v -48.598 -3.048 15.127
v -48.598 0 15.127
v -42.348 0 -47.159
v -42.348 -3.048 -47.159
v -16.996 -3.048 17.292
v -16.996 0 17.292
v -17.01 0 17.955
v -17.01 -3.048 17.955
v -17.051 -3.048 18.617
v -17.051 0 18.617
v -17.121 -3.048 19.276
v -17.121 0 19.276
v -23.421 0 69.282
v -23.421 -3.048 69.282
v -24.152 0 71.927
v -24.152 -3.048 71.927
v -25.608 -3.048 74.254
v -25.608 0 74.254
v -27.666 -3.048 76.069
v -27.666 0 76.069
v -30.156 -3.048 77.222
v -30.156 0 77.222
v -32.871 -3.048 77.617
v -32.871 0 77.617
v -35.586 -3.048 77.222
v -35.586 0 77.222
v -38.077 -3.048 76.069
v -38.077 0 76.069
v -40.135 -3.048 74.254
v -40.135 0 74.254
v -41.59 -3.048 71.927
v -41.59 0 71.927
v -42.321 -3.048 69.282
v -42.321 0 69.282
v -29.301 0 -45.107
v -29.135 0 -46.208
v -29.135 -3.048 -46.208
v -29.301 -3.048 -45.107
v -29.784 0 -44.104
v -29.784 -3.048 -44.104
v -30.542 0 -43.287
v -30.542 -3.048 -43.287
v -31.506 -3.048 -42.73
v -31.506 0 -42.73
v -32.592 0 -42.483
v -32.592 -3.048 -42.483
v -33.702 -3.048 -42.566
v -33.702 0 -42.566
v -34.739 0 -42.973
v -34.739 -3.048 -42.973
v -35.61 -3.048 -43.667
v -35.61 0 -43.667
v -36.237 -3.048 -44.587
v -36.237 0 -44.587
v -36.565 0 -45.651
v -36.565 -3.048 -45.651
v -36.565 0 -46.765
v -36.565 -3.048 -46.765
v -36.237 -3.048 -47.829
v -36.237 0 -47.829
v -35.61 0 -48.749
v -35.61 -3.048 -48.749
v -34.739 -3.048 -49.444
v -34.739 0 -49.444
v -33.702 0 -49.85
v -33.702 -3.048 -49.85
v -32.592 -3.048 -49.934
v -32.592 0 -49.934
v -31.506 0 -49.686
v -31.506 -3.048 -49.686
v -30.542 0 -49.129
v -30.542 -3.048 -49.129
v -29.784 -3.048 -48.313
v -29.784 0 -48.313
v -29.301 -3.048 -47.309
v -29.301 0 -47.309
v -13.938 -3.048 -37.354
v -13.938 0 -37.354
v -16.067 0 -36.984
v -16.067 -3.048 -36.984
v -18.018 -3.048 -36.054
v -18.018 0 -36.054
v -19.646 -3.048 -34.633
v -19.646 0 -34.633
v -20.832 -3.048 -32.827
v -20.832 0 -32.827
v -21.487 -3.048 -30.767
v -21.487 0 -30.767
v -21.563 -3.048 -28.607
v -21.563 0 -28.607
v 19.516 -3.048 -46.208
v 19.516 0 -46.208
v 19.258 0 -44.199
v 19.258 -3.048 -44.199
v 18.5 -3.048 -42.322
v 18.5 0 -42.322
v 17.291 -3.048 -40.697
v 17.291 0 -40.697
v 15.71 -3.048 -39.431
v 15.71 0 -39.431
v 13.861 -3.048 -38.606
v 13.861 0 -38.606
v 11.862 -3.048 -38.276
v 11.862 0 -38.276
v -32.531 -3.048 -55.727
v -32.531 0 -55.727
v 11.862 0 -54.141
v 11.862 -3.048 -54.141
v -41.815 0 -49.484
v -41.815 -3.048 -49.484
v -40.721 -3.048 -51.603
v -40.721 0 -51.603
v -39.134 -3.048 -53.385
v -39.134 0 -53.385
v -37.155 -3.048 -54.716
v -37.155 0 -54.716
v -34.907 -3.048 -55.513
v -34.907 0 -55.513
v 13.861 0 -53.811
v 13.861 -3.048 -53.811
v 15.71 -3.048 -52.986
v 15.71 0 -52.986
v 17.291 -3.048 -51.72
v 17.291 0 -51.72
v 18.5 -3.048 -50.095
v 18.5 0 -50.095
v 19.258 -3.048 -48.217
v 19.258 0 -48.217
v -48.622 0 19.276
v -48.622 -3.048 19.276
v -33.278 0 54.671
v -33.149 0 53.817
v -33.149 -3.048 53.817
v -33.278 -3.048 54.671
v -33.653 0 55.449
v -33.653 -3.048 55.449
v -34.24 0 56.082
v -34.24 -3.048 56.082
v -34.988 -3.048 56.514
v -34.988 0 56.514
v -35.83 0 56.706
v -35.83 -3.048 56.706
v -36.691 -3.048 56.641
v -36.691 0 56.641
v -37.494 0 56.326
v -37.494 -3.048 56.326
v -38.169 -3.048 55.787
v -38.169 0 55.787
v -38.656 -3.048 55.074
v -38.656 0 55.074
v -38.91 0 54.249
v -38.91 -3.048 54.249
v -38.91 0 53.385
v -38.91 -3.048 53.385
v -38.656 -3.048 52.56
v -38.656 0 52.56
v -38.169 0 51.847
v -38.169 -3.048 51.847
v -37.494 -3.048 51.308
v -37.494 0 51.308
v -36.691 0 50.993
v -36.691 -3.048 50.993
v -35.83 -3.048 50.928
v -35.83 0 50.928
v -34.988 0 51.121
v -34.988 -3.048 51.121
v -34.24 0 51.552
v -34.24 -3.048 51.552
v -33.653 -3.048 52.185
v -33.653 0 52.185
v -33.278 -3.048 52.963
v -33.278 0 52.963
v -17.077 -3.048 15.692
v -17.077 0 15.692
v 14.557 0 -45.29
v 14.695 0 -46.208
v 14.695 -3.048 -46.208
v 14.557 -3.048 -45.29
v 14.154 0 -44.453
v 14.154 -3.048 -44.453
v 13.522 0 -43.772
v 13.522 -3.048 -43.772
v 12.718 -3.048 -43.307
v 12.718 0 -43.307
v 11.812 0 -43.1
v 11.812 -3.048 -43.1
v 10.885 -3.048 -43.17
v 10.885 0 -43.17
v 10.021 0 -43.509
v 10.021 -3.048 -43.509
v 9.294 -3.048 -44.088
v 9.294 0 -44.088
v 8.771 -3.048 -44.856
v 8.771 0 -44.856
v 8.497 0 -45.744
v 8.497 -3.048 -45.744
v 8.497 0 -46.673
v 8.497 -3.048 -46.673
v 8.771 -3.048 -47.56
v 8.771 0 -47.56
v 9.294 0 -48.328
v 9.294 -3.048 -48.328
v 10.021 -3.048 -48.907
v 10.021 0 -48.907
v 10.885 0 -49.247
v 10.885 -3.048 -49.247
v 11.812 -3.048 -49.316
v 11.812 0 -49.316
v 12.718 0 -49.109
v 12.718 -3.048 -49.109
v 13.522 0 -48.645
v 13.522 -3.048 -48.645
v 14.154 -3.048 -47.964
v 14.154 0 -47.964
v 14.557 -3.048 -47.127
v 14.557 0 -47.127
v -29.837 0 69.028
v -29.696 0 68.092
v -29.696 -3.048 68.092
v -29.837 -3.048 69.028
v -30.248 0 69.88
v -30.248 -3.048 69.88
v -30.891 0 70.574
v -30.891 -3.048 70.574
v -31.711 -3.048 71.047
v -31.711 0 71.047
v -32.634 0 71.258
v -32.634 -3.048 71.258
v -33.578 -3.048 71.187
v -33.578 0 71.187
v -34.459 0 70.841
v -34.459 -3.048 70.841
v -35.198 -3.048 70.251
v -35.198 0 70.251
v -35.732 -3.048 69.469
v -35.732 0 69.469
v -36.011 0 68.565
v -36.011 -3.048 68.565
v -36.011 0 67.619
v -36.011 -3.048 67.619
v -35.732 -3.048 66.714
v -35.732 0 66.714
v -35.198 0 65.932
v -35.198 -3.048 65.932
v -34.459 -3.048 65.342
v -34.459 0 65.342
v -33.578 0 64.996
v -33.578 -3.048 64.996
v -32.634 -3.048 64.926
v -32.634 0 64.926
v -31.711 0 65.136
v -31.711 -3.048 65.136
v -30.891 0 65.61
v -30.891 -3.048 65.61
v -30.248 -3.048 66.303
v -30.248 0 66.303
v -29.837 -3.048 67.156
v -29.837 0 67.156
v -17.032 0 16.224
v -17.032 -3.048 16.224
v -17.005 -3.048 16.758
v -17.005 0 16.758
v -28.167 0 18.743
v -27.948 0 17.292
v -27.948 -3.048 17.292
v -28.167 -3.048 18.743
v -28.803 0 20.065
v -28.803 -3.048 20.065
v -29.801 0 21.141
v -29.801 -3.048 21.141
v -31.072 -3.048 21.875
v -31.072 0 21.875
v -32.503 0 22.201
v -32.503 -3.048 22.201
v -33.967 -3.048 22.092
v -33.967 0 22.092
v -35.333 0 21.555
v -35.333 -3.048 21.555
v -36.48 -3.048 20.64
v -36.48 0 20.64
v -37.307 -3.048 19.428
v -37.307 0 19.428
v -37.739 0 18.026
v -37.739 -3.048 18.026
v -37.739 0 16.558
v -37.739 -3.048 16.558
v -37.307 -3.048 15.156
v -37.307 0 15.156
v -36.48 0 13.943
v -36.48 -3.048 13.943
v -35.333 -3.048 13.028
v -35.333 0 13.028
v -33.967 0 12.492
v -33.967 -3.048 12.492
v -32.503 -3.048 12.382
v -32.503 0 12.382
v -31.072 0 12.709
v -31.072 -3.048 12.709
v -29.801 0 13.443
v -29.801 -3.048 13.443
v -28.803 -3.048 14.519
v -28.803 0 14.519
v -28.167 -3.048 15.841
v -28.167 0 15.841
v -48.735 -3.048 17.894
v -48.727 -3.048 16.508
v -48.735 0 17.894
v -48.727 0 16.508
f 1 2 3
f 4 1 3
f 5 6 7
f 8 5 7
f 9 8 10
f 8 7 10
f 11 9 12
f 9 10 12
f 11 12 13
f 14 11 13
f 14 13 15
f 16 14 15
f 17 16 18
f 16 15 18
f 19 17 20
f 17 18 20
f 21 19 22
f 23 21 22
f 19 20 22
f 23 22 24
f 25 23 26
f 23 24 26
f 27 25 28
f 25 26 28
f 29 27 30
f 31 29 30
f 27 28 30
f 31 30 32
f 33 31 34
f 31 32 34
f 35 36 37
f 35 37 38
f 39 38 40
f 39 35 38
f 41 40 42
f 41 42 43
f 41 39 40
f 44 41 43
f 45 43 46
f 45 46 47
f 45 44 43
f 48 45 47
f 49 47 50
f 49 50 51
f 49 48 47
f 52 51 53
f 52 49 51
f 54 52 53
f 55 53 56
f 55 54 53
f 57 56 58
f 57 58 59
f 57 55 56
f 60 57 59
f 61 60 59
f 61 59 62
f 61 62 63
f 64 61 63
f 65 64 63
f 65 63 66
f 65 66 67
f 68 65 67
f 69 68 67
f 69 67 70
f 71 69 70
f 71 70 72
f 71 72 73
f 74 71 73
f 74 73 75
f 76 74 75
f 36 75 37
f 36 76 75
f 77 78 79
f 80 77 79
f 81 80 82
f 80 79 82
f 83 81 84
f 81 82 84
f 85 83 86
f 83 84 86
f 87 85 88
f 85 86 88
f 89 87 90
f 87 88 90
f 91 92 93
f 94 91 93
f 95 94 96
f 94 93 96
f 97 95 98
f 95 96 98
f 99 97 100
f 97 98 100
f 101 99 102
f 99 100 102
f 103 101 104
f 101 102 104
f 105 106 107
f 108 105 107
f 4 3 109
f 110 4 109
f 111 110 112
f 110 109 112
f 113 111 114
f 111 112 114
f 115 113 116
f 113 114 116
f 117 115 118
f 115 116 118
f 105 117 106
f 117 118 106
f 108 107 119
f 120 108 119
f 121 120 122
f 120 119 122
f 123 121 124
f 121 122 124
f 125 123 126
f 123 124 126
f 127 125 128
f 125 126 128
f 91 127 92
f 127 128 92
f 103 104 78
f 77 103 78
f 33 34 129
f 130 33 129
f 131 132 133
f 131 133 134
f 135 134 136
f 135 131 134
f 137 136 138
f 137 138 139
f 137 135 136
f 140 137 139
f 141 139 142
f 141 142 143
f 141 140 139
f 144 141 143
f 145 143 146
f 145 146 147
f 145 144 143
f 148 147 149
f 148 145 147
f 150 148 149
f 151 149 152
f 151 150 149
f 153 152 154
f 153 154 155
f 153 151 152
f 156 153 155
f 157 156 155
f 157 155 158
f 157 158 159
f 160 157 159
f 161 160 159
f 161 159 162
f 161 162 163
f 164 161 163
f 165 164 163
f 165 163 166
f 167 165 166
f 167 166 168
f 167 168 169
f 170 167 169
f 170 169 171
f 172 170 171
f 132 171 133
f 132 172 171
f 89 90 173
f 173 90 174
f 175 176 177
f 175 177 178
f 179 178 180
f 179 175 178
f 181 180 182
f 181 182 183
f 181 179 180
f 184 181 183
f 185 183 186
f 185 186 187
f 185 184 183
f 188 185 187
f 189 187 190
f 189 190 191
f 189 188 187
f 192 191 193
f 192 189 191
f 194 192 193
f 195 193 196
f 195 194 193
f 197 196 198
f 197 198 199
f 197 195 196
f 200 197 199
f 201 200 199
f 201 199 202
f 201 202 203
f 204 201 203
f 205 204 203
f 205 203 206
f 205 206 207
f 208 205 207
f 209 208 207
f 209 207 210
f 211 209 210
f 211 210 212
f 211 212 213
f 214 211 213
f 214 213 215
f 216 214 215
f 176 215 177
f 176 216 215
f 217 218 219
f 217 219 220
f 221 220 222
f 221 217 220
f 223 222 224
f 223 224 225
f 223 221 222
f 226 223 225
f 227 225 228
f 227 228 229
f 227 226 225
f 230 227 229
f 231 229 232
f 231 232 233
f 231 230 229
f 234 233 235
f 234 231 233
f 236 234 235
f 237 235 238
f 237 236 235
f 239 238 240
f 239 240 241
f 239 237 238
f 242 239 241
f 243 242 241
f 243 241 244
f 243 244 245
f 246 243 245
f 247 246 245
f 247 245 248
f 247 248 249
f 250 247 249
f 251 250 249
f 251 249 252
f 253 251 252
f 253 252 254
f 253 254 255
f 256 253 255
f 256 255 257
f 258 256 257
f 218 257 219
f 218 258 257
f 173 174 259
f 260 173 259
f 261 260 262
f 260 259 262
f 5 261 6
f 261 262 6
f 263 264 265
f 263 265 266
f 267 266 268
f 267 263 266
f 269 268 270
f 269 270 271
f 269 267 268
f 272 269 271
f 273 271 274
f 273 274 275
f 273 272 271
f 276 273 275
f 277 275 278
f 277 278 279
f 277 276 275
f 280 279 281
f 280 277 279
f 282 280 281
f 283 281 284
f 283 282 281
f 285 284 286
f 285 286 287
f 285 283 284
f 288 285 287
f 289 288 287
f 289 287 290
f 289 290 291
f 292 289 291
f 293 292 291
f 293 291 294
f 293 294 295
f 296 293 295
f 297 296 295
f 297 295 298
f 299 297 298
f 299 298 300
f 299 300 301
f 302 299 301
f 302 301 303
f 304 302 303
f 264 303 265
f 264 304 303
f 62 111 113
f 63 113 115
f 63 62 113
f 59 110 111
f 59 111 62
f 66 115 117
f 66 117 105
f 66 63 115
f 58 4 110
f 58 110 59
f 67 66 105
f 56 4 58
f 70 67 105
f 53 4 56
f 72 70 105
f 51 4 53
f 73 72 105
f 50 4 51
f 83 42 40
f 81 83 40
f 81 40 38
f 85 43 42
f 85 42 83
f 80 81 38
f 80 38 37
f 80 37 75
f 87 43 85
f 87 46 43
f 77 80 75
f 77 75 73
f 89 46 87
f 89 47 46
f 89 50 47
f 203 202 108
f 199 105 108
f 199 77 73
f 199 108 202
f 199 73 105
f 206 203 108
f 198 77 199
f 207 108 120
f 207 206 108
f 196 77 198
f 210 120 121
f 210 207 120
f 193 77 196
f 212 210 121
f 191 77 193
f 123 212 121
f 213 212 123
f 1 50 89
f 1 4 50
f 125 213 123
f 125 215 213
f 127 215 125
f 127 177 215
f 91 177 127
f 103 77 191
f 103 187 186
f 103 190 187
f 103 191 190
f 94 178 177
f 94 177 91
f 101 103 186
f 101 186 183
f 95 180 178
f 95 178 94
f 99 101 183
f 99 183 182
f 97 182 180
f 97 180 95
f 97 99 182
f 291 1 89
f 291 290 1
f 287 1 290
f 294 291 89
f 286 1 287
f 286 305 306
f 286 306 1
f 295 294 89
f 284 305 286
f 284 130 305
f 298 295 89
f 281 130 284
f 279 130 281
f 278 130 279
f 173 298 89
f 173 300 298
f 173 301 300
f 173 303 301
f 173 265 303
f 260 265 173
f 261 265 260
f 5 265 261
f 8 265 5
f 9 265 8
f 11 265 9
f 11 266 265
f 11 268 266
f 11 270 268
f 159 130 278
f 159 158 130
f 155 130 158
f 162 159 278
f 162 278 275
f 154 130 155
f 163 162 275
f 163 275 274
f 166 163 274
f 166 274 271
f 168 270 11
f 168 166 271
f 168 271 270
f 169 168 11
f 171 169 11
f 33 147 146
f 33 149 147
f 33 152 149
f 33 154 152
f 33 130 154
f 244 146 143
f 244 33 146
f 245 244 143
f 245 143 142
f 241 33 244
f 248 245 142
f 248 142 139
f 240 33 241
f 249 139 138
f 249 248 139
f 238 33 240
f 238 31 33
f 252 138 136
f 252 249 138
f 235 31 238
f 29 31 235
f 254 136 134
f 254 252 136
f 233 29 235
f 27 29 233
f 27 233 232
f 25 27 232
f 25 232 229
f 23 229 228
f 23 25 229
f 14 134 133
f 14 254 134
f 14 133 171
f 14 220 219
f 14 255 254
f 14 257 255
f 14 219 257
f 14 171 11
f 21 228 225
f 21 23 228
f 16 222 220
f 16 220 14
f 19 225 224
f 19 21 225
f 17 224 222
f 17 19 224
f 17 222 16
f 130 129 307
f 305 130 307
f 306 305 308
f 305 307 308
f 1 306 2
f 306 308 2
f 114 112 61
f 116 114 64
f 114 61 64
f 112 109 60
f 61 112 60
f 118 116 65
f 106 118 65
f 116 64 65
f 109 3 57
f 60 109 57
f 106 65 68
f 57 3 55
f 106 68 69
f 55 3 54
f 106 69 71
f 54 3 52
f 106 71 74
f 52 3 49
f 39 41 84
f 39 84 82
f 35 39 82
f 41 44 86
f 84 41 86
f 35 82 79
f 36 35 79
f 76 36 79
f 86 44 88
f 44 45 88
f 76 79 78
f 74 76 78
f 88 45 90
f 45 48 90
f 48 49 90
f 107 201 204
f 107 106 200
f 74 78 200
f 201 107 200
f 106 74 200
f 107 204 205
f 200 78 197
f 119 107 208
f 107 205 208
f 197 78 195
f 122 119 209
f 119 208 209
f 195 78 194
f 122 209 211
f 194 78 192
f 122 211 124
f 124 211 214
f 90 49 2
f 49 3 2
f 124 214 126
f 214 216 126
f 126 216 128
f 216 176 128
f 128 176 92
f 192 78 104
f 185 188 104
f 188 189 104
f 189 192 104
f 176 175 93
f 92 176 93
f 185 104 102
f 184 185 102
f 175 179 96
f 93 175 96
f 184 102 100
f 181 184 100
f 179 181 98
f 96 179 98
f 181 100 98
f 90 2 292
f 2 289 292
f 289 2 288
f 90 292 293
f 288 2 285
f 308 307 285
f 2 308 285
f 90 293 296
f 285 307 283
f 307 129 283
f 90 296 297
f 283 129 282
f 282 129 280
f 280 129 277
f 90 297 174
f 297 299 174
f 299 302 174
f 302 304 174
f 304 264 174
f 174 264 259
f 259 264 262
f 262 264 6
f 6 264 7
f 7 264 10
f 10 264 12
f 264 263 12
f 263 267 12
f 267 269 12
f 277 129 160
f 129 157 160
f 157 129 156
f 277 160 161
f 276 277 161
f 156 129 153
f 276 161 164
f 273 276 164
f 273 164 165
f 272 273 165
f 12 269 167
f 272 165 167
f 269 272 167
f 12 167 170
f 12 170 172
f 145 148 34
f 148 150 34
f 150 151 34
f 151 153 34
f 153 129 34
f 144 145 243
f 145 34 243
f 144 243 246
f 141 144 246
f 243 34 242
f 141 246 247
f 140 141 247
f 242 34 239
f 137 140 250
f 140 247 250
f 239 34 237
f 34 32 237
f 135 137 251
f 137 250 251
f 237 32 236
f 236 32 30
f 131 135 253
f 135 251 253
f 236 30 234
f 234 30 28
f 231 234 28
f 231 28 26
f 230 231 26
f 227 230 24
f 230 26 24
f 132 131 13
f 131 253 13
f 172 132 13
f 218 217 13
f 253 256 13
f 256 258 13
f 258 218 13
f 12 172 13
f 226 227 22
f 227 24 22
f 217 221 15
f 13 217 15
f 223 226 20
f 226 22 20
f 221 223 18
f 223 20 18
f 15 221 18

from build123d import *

# Parameters (mm, degrees)
F0_R     = 3.175
F0_R_2   = 2.8967213822
F0_R_3   = 4.9231792558
F0_R_4   = 3.7359067091
F0_R_5   = 3.1164885501
F1_DEPTH = 3.048


with BuildPart() as f1:
    # F0 (on Front) → F1 (new body)
    with BuildSketch(Plane.XZ):
        with BuildLine():
            ThreePointArc((-42.3213338093, 69.2824711493), (-33.4675240871, 58.5855412551), (-23.3460408451, 68.0918461493))
            ThreePointArc((-23.3460408451, 68.0918461493), (-23.3647359509, 68.6883293913), (-23.4207478809, 69.2824711493))
            ThreePointArc((-23.4207478809, 69.2824711493), (-32.8710408451, 77.6168461493), (-42.3213338093, 69.2824711493))
        make_face()
        with Locations((-32.8710408451, 68.0918461493)):
            Circle(F0_R, mode=Mode.SUBTRACT)
        with BuildLine():
            ThreePointArc((-23.4207478809, 69.2824711493), (-23.3647359509, 68.6883293913), (-23.3460408451, 68.0918461493))
            ThreePointArc((-23.3460408451, 68.0918461493), (-33.4675240871, 58.5855412551), (-42.3213338093, 69.2824711493))
            Line((-42.3213338093, 69.2824711493), (-48.6215291188, 19.2762211493))
            ThreePointArc((-48.6215291188, 19.2762211493), (-32.8710408451, 33.1668461493), (-17.1205525714, 19.2762211493))
            Line((-17.1205525714, 19.2762211493), (-23.4207478809, 69.2824711493))
        make_face()
        with Locations((-36.0460408451, 53.8170461493)):
            Circle(F0_R_2, mode=Mode.SUBTRACT)
        with BuildLine():
            ThreePointArc((-16.9960408451, 17.2918461493), (-17.0271993547, 18.2859848859), (-17.1205525714, 19.2762211493))
            ThreePointArc((-17.1205525714, 19.2762211493), (-32.8710408451, 33.1668461493), (-48.6215291188, 19.2762211493))
            ThreePointArc((-48.6215291188, 19.2762211493), (-48.7457796213, 17.2007759138), (-48.5977252432, 15.1268928374))
            ThreePointArc((-48.5977252432, 15.1268928374), (-32.5863651682, 1.4193988031), (-17.0768380415, 15.6922265698))
            ThreePointArc((-17.0768380415, 15.6922265698), (-17.0162530114, 16.4910167377), (-16.9960408451, 17.2918461493))
        make_face()
        with Locations((-32.8710408451, 17.2918461493)):
            Circle(F0_R_3, mode=Mode.SUBTRACT)
        with BuildLine():
            ThreePointArc((-17.0768380415, 15.6922265698), (-32.5863651682, 1.4193988031), (-48.5977252432, 15.1268928374))
            Line((-48.5977252432, 15.1268928374), (-42.3484581137, -47.1590412869))
            ThreePointArc((-42.3484581137, -47.1590412869), (-39.8191713507, -39.692855893), (-32.5308622319, -36.6892304078))
            Line((-32.5308622319, -36.6892304078), (-22.4185752351, -37.0506140669))
            Line((-22.4185752351, -37.0506140669), (-21.5634638108, -28.6074795691))
            Line((-21.5634638108, -28.6074795691), (-17.0768380415, 15.6922265698))
        make_face()
        with BuildLine():
            ThreePointArc((-32.5308622319, -36.6892304078), (-39.8191713507, -39.692855893), (-42.3484581137, -47.1590412869))
            ThreePointArc((-42.3484581137, -47.1590412869), (-39.1340347775, -53.3845409642), (-32.5308622705, -55.727077295))
            ThreePointArc((-32.5308622705, -55.727077295), (-26.0166325584, -52.8219811873), (-23.3460408451, -46.2081538507))
            ThreePointArc((-23.3460408451, -46.2081538507), (-26.0166325449, -39.594326528), (-32.5308622319, -36.6892304078))
        make_face()
        with Locations((-32.8710408451, -46.2081538507)):
            Circle(F0_R_4, mode=Mode.SUBTRACT)
        with BuildLine():
            Line((-22.4185752351, -37.0506140669), (-32.5308622319, -36.6892304078))
            ThreePointArc((-32.5308622319, -36.6892304078), (-26.0166325449, -39.594326528), (-23.3460408451, -46.2081538507))
            Line((-23.3460408451, -46.2081538507), (-22.4185752351, -37.0506140669))
        make_face()
        with BuildLine():
            ThreePointArc((-13.9376627644, -37.3536971559), (-19.6460678, -34.6332730975), (-21.5634638108, -28.6074795691))
            Line((-21.5634638108, -28.6074795691), (-22.4185752351, -37.0506140669))
            Line((-22.4185752351, -37.0506140669), (-13.9376627644, -37.3536971559))
        make_face()
        with BuildLine():
            ThreePointArc((-23.3460408451, -46.2081538507), (-26.0166325584, -52.8219811873), (-32.5308622705, -55.727077295))
            Line((-32.53086227, -55.7270773096), (11.8624413004, -54.1405900542))
            ThreePointArc((11.8624413004, -54.1405900542), (3.6414591549, -46.2081538504), (11.862441301, -38.2757176472))
            Line((11.8624413004, -38.2757176655), (-13.9376627644, -37.3536971559))
            Line((-13.9376627644, -37.3536971559), (-22.4185752351, -37.0506140669))
            Line((-22.4185752351, -37.0506140669), (-23.3460408451, -46.2081538507))
        make_face()
        with BuildLine():
            ThreePointArc((11.862441301, -38.2757176472), (3.6414591549, -46.2081538504), (11.8624413004, -54.1405900542))
            ThreePointArc((11.8624413004, -54.1405900542), (17.2909660605, -51.7196766312), (19.5164591549, -46.2081538507))
            ThreePointArc((19.5164591549, -46.2081538507), (17.2909660607, -40.6966310704), (11.862441301, -38.2757176472))
        make_face()
        with Locations((11.5789591549, -46.2081538507)):
            Circle(F0_R_5, mode=Mode.SUBTRACT)
    extrude(amount=F1_DEPTH)


solid = f1.part
